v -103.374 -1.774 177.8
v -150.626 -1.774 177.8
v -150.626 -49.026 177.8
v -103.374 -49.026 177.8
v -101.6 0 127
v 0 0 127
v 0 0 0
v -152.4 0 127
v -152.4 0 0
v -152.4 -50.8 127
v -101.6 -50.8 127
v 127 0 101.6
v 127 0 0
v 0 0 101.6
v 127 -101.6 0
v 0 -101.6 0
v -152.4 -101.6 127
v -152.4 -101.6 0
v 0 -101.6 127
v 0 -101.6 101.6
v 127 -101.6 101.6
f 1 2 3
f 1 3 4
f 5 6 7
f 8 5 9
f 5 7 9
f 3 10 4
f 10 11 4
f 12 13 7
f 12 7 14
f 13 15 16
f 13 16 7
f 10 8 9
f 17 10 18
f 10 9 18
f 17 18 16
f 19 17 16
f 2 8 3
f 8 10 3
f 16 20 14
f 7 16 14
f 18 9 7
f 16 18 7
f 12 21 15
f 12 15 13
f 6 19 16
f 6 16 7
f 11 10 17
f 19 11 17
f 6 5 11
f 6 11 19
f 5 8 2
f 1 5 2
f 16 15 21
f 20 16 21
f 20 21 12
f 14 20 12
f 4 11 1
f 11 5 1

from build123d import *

# Parameters (mm, degrees)
F1_DEPTH = 127
F2_W     = 50.8
F2_H     = 50.8
F3_DEPTH = 50.8
F3_TAPER = 2
F4_W     = 101.6
F4_H     = 101.6
F5_DEPTH = 127


with BuildPart() as f1:
    # F0 (on Top) → F1 (new body)
    with BuildSketch(Plane.XY):
        Polygon((0, -101.6), (0, 0), (-152.4, 0), (-152.4, -83.5059957942), (-152.4, -101.6), (-73.8790052375, -101.6), align=None)
    extrude(amount=F1_DEPTH)

    # F2 (on face) → F3 (join)
    with BuildSketch(Plane.XY.offset(127)):
        with Locations((-127, -25.4)):
            Rectangle(F2_W, F2_H)
    extrude(amount=F3_DEPTH, taper=F3_TAPER)


with BuildPart() as f5:
    # F4 (on face) → F5 (new body)
    with BuildSketch(Plane.YZ):
        with Locations((-50.8, 50.8)):
            Rectangle(F4_W, F4_H)
    extrude(amount=F5_DEPTH)


solid = Compound([f1.part, f5.part])
